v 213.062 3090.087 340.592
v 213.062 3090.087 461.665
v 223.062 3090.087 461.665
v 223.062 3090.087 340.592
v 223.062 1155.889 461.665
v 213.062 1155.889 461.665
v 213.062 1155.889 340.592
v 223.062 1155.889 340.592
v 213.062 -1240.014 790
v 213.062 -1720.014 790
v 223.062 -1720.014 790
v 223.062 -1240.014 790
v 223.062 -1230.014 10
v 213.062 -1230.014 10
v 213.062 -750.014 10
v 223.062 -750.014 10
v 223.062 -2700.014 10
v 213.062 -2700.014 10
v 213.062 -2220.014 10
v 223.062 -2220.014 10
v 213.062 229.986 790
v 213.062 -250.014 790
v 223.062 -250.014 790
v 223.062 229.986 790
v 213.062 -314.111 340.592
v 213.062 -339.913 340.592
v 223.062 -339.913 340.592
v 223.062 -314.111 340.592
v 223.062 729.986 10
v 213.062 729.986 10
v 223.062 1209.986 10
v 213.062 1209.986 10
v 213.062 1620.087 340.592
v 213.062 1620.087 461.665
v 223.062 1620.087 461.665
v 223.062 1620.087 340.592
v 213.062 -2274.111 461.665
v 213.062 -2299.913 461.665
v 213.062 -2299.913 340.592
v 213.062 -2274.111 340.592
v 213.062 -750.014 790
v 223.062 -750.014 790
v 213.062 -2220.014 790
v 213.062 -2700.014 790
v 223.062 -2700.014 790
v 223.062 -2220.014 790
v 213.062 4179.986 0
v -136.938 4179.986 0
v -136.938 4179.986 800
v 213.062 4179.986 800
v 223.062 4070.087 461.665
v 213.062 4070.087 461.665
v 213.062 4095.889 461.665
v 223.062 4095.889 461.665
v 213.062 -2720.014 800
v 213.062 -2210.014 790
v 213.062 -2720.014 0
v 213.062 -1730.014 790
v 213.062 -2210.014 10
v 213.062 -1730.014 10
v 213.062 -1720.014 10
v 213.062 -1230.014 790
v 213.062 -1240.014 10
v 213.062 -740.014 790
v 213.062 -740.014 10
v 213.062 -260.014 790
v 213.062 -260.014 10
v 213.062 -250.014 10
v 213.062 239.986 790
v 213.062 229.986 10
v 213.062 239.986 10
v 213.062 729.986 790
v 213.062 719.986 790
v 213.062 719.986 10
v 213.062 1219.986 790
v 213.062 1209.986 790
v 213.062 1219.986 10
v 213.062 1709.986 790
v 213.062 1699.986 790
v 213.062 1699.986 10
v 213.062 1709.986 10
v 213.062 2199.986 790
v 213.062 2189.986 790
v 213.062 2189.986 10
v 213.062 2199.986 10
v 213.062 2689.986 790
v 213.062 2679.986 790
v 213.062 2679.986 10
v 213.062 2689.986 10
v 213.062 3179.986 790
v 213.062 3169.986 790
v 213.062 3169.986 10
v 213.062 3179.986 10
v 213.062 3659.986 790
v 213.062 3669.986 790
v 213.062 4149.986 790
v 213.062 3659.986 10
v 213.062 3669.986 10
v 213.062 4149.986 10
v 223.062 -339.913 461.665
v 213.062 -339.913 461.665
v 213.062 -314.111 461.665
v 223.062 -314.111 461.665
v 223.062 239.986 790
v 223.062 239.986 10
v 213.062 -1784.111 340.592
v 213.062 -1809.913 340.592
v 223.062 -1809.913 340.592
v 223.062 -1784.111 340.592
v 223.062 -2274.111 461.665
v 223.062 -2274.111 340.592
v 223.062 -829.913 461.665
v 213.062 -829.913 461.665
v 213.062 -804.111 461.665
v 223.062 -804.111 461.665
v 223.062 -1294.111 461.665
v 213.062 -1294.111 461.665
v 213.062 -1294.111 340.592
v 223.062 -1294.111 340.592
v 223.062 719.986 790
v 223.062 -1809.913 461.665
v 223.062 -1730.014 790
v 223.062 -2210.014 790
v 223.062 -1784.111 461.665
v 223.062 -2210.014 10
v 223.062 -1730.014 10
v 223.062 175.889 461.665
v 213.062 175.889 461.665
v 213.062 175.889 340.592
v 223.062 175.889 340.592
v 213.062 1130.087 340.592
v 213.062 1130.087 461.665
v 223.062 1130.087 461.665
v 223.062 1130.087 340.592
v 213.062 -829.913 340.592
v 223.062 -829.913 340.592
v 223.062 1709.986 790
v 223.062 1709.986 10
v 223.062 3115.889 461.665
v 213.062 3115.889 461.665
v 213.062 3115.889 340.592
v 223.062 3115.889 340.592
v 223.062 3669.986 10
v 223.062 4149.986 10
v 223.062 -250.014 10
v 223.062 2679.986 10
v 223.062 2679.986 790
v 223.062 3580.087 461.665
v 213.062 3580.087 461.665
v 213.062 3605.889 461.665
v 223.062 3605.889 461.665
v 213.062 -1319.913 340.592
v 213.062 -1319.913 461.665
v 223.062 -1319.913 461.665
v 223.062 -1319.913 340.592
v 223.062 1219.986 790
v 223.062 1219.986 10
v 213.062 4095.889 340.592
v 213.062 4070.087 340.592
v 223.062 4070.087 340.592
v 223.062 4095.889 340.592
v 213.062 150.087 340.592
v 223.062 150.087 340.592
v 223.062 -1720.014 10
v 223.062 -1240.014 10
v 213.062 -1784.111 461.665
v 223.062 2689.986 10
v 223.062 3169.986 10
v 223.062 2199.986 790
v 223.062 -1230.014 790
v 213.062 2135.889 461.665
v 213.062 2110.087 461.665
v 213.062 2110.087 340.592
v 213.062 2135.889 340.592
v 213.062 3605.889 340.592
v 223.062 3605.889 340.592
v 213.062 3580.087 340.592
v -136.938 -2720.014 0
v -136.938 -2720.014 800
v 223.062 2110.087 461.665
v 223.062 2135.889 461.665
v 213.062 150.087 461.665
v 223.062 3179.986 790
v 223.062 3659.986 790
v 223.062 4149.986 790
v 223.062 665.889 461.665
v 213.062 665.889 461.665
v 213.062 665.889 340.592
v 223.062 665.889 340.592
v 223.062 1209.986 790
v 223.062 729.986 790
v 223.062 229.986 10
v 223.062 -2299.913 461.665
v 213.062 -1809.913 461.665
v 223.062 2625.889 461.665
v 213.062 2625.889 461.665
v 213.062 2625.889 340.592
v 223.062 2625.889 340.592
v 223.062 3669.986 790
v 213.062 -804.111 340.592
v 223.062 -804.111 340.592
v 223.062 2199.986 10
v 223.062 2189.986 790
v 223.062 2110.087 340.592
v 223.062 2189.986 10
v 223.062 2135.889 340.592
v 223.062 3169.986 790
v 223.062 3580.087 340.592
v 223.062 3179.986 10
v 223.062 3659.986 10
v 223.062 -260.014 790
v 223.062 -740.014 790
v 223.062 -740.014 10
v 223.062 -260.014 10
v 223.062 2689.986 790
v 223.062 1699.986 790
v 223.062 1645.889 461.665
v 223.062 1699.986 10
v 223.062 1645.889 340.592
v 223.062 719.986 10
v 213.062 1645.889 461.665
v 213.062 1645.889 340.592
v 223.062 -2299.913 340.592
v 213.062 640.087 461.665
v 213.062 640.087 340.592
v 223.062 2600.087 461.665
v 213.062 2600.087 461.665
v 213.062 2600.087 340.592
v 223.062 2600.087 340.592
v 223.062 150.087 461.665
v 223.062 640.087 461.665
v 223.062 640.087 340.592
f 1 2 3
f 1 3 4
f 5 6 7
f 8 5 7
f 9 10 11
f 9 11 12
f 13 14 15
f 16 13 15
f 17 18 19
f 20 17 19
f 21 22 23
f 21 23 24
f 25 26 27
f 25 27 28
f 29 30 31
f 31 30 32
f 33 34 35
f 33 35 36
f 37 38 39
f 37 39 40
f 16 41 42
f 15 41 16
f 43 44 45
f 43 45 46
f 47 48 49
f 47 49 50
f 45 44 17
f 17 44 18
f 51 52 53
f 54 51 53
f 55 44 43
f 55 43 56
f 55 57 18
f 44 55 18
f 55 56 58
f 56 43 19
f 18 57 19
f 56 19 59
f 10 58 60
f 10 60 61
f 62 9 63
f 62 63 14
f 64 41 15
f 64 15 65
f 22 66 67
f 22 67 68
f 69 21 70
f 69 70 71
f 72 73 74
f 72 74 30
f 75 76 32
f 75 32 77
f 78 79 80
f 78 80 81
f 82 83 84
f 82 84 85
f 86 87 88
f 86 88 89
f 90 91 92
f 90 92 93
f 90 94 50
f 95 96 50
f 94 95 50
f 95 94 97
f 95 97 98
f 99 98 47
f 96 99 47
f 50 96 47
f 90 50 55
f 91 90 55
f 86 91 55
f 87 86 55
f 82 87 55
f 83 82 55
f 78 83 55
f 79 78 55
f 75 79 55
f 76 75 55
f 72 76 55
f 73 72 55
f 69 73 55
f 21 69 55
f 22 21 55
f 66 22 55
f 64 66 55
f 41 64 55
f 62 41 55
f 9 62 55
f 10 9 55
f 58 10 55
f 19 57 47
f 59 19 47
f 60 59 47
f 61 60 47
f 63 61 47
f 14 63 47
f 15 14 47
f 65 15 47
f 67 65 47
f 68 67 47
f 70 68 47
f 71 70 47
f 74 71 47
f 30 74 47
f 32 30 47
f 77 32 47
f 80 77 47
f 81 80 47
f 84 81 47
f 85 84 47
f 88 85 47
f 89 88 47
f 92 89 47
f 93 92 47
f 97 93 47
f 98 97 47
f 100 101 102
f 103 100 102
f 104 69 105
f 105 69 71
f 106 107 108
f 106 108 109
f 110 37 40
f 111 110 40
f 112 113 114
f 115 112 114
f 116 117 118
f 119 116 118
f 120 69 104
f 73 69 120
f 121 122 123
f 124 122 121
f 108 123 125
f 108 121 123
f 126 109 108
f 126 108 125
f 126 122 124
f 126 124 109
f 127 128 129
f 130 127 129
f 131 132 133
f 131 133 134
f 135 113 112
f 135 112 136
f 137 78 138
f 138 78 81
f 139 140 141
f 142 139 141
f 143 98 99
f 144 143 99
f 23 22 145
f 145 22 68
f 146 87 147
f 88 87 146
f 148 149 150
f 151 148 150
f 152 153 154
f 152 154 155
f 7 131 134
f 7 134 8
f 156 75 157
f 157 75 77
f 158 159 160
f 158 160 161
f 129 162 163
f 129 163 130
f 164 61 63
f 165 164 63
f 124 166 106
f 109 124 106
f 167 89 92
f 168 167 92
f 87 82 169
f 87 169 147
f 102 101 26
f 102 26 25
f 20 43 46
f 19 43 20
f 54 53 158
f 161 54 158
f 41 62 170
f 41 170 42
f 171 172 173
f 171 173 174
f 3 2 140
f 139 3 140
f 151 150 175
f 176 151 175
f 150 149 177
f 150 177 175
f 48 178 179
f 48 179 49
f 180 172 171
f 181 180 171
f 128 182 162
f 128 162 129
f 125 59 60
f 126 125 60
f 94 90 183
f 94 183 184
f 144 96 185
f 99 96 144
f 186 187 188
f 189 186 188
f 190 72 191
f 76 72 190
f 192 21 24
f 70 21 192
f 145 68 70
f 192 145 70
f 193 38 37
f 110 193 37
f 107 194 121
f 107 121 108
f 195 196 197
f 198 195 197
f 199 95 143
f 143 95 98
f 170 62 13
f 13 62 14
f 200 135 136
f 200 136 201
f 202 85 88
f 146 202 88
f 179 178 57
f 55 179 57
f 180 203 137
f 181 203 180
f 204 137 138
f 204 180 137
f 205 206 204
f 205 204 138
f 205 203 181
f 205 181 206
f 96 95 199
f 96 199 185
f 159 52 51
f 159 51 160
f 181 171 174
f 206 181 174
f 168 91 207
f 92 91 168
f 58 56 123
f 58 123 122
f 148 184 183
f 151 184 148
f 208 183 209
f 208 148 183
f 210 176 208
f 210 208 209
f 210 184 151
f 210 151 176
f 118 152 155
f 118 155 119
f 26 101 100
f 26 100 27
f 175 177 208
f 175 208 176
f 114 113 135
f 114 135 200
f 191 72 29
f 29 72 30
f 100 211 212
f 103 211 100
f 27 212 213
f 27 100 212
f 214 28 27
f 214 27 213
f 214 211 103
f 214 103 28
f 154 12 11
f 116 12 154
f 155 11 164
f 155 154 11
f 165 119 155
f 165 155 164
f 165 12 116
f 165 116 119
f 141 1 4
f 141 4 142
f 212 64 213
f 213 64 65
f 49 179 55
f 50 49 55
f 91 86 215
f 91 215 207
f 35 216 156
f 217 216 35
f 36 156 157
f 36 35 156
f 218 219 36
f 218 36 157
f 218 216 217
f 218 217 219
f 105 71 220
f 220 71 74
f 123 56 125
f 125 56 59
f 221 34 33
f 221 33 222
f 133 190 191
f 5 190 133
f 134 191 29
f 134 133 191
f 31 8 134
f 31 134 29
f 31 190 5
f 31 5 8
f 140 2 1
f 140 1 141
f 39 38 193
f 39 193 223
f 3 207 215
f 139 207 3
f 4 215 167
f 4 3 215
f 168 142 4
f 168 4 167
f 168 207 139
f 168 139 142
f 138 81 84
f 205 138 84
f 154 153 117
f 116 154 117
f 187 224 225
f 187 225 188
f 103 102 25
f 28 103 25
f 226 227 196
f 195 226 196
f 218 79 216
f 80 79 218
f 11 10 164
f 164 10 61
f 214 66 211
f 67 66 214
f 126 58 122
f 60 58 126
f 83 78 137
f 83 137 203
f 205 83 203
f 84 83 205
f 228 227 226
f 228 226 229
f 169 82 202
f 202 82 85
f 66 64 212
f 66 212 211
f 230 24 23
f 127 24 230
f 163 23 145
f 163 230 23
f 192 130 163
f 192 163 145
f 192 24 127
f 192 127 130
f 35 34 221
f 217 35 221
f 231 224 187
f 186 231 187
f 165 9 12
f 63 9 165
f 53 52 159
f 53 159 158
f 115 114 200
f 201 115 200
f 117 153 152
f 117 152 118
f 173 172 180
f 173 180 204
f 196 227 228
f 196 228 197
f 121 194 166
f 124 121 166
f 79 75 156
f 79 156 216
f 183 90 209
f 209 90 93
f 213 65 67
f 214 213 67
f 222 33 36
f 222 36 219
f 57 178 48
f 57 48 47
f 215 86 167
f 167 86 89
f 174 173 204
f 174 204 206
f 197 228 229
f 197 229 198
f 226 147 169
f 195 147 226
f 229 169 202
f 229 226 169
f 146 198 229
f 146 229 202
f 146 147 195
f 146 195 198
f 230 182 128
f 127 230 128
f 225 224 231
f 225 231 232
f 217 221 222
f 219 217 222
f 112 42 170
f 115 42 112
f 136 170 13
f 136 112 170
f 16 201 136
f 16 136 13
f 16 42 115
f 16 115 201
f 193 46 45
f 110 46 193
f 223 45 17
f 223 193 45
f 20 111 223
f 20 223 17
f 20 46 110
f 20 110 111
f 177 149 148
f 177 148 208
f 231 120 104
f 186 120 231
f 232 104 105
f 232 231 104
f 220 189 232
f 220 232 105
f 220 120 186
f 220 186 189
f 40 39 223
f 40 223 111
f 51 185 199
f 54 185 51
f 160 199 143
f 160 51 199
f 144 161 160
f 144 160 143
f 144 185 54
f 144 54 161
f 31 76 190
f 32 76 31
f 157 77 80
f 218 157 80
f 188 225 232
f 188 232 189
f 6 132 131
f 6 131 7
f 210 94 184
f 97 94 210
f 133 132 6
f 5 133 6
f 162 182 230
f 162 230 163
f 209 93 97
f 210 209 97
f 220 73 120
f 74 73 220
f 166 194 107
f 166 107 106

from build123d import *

# Parameters (mm, degrees)
SKETCH1_W           = 350
SKETCH1_H           = 6900
BOSS_EXTRUDE1_DEPTH = 800
SKETCH3_W           = 780
SKETCH3_H           = 480
SKETCH3_W_2         = 121.072841775
SKETCH3_H_2         = 25.802408902
BOSS_EXTRUDE3_DEPTH = 10


with BuildPart() as part:
    # Sketch1 → Boss-Extrude1 (new body)
    with BuildSketch(Plane.XY):
        with Locations((38.061970043, 729.986327315)):
            Rectangle(SKETCH1_W, SKETCH1_H)
    extrude(amount=BOSS_EXTRUDE1_DEPTH)

    # Sketch3 → Boss-Extrude3 (add)
    with BuildSketch(Plane(origin=(213.061970043, 0, 0), x_dir=(0, 0, -1), z_dir=(1, 0, 0))):
        with Locations((-400, -2460.013672685)):
            Rectangle(SKETCH3_W, SKETCH3_H)
        with Locations((-401.128332344, -2287.011976611)):
            Rectangle(SKETCH3_W_2, SKETCH3_H_2, mode=Mode.SUBTRACT)
        with Locations((-400, -1480.013672685)):
            Rectangle(SKETCH3_W, SKETCH3_H)
        with Locations((-401.128332344, -1307.011976611)):
            Rectangle(SKETCH3_W_2, SKETCH3_H_2, mode=Mode.SUBTRACT)
        with Locations((-400, -1970.013672685)):
            Rectangle(SKETCH3_W, SKETCH3_H)
        with Locations((-401.128332344, -1797.011976611)):
            Rectangle(SKETCH3_W_2, SKETCH3_H_2, mode=Mode.SUBTRACT)
        with Locations((-400, -990.013672685)):
            Rectangle(SKETCH3_W, SKETCH3_H)
        with Locations((-401.128332344, -817.011976611)):
            Rectangle(SKETCH3_W_2, SKETCH3_H_2, mode=Mode.SUBTRACT)
        with Locations((-400, -500.013672685)):
            Rectangle(SKETCH3_W, SKETCH3_H)
        with Locations((-401.128332344, -327.011976611)):
            Rectangle(SKETCH3_W_2, SKETCH3_H_2, mode=Mode.SUBTRACT)
        with Locations((-400, -10.013672685)):
            Rectangle(SKETCH3_W, SKETCH3_H)
        with Locations((-401.128332344, 162.988023389)):
            Rectangle(SKETCH3_W_2, SKETCH3_H_2, mode=Mode.SUBTRACT)
        with Locations((-400, 479.986327315)):
            Rectangle(SKETCH3_W, SKETCH3_H)
        with Locations((-401.128332344, 652.988023389)):
            Rectangle(SKETCH3_W_2, SKETCH3_H_2, mode=Mode.SUBTRACT)
        with Locations((-400, 969.986327315)):
            Rectangle(SKETCH3_W, SKETCH3_H)
        with Locations((-401.128332344, 1142.988023389)):
            Rectangle(SKETCH3_W_2, SKETCH3_H_2, mode=Mode.SUBTRACT)
        with Locations((-400, 1459.986327315)):
            Rectangle(SKETCH3_W, SKETCH3_H)
        with Locations((-401.128332344, 1632.988023389)):
            Rectangle(SKETCH3_W_2, SKETCH3_H_2, mode=Mode.SUBTRACT)
        with Locations((-400, 1949.986327315)):
            Rectangle(SKETCH3_W, SKETCH3_H)
        with Locations((-401.128332344, 2122.988023389)):
            Rectangle(SKETCH3_W_2, SKETCH3_H_2, mode=Mode.SUBTRACT)
        with Locations((-400, 2439.986327315)):
            Rectangle(SKETCH3_W, SKETCH3_H)
        with Locations((-401.128332344, 2612.988023389)):
            Rectangle(SKETCH3_W_2, SKETCH3_H_2, mode=Mode.SUBTRACT)
        with Locations((-400, 2929.986327315)):
            Rectangle(SKETCH3_W, SKETCH3_H)
        with Locations((-401.128332344, 3102.988023389)):
            Rectangle(SKETCH3_W_2, SKETCH3_H_2, mode=Mode.SUBTRACT)
        with Locations((-400, 3419.986327315)):
            Rectangle(SKETCH3_W, SKETCH3_H)
        with Locations((-401.128332344, 3592.988023389)):
            Rectangle(SKETCH3_W_2, SKETCH3_H_2, mode=Mode.SUBTRACT)
        with Locations((-400, 3909.986327315)):
            Rectangle(SKETCH3_W, SKETCH3_H)
        with Locations((-401.128332344, 4082.988023389)):
            Rectangle(SKETCH3_W_2, SKETCH3_H_2, mode=Mode.SUBTRACT)
    extrude(amount=BOSS_EXTRUDE3_DEPTH)


solid = part.part
